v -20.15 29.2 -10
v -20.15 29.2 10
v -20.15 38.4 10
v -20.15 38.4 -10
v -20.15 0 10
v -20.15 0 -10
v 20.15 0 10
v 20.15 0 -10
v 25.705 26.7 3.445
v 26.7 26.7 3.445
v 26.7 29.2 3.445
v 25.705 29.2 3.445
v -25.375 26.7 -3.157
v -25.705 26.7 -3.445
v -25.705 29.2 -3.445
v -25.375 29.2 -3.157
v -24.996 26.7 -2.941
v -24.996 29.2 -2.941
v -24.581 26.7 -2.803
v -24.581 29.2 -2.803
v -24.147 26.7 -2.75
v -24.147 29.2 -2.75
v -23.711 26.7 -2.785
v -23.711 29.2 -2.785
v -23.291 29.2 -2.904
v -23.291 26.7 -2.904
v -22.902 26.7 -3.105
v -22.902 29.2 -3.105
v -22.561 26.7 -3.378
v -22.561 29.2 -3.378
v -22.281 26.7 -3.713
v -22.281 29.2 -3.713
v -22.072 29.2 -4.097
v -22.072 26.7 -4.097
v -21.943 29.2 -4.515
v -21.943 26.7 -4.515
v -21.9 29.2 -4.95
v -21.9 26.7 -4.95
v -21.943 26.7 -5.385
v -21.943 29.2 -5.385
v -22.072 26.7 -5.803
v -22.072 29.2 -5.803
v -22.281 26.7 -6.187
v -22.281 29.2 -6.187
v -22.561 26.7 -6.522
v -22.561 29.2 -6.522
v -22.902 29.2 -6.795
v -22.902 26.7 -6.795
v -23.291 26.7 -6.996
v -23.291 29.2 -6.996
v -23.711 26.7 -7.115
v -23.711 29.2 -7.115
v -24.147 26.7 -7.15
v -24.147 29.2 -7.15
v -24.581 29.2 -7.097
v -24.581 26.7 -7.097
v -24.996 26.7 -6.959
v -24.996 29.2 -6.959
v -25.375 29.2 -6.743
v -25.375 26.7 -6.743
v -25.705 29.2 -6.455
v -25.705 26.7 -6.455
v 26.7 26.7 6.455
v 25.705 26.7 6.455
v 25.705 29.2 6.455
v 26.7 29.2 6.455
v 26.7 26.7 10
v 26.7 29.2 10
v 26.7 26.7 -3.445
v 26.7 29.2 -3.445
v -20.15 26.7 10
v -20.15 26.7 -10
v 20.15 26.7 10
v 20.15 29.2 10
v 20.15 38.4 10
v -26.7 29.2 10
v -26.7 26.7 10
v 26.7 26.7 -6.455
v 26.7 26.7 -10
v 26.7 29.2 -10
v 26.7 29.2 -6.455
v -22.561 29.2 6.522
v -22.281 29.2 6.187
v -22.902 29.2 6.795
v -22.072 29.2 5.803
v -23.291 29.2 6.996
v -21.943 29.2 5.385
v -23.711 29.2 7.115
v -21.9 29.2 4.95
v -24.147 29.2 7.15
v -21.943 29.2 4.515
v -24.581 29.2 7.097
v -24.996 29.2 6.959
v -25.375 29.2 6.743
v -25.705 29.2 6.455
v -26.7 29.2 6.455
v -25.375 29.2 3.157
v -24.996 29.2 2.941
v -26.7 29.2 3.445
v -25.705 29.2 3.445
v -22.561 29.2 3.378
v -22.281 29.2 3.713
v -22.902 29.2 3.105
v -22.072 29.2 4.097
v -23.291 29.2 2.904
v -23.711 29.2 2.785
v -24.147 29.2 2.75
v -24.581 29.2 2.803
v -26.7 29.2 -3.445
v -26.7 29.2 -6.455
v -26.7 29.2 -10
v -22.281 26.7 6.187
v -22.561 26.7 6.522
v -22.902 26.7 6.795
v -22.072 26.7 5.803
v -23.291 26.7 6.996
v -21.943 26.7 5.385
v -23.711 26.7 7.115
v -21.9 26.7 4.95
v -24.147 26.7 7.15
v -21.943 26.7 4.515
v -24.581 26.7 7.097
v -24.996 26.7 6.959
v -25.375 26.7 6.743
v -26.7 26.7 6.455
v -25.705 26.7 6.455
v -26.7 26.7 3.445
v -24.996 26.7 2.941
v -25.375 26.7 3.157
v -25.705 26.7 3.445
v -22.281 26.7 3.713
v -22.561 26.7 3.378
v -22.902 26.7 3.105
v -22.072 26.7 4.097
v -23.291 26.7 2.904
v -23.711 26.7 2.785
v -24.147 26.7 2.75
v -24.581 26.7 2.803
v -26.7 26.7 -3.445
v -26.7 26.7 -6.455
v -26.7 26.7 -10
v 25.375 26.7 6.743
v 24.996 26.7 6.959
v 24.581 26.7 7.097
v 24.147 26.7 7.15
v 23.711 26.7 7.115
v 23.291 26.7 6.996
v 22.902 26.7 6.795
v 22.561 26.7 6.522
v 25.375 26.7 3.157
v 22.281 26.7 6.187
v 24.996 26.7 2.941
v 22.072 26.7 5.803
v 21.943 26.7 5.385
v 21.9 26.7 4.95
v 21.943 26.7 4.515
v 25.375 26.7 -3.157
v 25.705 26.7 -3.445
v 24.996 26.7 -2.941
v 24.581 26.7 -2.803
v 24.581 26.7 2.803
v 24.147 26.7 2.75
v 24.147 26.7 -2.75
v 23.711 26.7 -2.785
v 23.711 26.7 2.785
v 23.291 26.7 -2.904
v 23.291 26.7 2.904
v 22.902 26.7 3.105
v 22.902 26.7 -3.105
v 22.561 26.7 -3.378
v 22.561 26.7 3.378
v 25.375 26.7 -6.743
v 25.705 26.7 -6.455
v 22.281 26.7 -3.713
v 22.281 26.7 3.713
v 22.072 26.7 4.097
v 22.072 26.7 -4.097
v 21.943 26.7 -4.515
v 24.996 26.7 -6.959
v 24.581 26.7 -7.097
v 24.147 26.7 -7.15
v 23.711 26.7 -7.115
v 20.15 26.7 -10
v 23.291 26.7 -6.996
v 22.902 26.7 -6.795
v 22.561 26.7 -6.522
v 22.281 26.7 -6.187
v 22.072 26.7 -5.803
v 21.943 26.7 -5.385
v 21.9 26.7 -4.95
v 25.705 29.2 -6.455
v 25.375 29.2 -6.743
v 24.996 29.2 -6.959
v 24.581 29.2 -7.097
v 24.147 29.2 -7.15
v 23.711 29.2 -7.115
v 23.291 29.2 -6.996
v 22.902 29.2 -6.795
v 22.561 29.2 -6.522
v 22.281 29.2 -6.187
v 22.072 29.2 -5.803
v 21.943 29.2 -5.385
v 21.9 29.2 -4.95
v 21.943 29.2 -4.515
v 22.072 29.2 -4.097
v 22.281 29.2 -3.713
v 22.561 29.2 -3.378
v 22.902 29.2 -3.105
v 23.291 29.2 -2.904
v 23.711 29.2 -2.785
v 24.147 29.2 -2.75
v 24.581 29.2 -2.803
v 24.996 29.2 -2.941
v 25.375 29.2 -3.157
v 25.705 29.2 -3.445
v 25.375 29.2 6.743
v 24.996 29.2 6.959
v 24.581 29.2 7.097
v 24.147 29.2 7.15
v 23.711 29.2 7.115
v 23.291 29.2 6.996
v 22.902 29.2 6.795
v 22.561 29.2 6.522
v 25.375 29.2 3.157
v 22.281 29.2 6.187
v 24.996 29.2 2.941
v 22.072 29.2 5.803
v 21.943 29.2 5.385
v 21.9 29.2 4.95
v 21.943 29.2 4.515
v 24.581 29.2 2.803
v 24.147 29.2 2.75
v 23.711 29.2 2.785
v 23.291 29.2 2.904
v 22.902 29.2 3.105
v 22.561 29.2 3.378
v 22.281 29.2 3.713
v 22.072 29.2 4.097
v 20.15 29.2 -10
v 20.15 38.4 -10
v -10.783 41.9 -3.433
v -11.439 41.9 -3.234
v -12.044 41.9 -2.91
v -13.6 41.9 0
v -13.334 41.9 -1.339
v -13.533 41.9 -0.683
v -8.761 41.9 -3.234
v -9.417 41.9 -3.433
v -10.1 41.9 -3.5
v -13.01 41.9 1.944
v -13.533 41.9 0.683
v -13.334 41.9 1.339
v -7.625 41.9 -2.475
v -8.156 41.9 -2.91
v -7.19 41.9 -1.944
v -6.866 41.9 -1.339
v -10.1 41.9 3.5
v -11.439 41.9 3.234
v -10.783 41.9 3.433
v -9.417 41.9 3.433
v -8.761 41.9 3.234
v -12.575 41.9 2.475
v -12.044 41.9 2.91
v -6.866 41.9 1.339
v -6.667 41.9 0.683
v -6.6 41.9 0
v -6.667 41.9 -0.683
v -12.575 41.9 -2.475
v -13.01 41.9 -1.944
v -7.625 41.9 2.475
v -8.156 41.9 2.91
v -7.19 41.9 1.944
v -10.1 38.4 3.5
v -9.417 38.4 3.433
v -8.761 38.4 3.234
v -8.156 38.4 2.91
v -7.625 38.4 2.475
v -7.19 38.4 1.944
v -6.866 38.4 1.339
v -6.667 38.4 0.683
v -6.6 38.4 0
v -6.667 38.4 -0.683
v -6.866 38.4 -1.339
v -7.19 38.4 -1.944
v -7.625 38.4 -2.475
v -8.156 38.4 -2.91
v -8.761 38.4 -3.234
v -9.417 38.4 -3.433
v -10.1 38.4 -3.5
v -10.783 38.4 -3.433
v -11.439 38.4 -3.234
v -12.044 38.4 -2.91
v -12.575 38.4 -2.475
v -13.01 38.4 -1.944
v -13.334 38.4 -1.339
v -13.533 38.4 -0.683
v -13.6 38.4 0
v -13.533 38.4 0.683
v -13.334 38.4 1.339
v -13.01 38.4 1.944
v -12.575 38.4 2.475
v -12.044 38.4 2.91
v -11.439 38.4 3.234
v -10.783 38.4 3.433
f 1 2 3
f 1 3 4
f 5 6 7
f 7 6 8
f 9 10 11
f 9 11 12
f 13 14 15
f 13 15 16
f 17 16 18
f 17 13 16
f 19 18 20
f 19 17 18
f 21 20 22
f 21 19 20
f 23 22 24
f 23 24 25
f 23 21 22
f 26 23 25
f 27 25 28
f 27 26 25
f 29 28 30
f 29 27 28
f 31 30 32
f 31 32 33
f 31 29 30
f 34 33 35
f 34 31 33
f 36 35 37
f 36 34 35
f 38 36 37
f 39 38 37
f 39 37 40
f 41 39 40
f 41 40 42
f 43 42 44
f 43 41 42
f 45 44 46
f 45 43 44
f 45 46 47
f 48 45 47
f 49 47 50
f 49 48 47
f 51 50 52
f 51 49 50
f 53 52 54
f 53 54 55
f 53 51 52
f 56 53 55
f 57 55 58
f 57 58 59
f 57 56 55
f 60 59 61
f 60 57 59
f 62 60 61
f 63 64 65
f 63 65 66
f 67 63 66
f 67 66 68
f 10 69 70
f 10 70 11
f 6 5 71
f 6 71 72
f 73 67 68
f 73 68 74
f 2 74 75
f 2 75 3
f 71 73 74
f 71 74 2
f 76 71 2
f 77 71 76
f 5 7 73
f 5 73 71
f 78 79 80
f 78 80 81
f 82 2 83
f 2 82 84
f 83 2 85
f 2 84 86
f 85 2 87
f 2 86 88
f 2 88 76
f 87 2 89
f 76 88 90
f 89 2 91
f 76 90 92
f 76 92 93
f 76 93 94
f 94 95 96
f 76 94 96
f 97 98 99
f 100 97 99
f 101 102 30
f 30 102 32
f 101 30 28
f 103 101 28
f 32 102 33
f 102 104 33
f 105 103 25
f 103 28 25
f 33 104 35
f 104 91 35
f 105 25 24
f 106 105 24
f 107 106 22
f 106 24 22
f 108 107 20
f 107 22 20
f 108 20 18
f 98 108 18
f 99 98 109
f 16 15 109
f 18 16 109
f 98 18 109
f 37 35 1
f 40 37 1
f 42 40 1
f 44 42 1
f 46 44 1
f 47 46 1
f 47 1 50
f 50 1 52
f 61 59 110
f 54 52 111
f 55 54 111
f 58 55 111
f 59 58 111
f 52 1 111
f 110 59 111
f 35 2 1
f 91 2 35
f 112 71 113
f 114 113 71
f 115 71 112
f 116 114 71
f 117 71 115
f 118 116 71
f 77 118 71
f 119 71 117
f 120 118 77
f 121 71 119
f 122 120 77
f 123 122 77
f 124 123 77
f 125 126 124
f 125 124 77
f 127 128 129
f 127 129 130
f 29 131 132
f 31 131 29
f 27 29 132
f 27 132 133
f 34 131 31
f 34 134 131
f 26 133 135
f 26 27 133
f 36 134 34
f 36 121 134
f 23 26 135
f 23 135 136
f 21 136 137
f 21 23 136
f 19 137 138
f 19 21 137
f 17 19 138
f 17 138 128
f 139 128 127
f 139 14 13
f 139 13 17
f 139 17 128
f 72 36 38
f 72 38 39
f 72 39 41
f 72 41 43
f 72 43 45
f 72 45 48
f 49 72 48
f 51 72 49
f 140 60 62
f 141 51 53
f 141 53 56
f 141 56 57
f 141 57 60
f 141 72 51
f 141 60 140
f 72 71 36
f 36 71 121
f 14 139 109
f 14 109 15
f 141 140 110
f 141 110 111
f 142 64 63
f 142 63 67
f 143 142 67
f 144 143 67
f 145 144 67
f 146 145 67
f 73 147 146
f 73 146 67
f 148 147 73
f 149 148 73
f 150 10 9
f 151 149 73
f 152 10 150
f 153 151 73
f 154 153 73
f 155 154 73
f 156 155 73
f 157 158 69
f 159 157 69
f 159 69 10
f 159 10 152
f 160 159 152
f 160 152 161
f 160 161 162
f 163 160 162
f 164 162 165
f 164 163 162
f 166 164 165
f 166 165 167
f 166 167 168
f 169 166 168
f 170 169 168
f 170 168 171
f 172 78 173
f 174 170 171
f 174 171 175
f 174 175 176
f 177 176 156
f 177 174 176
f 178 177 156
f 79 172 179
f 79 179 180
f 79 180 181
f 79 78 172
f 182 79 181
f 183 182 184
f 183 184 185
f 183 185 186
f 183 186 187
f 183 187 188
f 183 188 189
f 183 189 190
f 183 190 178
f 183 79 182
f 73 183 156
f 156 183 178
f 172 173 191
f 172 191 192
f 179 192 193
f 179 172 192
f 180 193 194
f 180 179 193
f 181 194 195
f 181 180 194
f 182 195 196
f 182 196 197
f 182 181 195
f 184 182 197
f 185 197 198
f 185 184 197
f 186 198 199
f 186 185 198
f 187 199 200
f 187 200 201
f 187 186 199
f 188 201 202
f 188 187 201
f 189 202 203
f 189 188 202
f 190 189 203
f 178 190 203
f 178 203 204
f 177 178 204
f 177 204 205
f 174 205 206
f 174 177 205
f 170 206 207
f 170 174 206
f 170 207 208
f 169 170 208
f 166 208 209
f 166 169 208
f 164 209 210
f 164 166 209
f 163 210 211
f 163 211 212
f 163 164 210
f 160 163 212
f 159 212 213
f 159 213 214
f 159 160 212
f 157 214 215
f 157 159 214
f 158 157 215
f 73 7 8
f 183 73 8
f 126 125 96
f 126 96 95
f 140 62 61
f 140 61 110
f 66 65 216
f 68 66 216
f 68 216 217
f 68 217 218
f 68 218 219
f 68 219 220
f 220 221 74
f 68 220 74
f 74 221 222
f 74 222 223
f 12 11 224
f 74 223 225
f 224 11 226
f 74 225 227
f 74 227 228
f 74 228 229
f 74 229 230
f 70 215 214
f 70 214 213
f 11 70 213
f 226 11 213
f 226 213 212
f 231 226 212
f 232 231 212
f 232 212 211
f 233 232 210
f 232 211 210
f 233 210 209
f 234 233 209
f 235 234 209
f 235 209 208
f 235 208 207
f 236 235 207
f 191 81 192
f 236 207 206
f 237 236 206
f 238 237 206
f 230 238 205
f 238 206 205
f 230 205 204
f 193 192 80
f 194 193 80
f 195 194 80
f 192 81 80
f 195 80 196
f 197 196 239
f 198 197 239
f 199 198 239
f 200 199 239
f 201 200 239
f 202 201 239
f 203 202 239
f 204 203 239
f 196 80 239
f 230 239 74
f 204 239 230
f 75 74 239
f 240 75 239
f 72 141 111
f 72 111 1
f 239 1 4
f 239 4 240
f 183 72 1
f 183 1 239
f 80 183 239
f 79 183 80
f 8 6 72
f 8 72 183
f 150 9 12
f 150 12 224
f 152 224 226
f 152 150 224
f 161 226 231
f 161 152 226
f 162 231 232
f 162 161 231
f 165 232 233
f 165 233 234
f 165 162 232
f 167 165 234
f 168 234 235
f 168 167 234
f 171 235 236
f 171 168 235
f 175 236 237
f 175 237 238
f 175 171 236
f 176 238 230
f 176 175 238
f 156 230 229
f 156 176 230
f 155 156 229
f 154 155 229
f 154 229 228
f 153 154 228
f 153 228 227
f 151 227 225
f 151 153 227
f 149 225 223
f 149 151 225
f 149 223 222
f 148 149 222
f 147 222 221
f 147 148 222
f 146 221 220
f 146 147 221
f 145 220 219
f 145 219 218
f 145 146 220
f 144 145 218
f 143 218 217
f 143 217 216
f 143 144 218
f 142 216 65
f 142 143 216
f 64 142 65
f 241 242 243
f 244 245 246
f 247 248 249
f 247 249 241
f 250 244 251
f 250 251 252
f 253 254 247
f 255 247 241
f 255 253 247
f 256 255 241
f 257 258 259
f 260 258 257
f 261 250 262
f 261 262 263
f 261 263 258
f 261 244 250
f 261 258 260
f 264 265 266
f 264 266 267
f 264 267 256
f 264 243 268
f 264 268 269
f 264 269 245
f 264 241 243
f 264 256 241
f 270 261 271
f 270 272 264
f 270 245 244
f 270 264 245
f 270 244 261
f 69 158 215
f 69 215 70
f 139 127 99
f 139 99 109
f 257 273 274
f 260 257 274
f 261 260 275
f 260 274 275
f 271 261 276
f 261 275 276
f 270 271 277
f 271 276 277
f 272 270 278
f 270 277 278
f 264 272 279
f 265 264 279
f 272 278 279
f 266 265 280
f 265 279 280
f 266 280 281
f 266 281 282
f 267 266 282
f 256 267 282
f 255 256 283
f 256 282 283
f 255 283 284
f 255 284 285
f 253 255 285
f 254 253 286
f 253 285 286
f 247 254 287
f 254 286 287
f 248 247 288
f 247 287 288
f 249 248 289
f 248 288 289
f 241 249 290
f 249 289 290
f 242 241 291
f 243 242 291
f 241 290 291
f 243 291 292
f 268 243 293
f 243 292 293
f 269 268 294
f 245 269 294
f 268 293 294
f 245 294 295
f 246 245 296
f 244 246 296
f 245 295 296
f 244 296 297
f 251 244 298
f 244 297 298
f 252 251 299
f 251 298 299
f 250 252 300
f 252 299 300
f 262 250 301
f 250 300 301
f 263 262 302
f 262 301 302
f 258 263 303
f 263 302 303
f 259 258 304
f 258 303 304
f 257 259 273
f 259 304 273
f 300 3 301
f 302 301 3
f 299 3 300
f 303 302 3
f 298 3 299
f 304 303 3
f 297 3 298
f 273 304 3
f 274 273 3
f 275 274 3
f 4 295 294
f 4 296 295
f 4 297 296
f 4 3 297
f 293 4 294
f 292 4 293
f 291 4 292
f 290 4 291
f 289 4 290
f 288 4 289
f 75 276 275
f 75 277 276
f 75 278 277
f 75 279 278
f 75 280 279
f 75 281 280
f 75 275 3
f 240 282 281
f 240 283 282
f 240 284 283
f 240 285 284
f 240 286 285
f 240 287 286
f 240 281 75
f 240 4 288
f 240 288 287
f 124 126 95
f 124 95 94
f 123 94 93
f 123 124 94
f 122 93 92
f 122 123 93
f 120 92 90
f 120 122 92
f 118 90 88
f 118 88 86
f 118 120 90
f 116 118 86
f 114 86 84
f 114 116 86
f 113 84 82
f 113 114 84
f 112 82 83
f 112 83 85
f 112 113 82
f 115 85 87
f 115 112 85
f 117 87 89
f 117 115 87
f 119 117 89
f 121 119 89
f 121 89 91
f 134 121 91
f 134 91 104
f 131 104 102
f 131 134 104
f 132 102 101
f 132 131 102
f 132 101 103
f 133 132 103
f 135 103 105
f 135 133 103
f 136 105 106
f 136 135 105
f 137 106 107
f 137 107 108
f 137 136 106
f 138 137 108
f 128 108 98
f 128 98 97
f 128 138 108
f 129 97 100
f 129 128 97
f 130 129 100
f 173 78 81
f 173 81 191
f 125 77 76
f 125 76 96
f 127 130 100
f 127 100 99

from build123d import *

# Parameters (mm, degrees)
SKETCH1_W           = 40.3
SKETCH1_H           = 20
BOSS_EXTRUDE1_DEPTH = 38.4
BOSS_EXTRUDE3_START = -11.7
BOSS_EXTRUDE3_DEPTH = 2.5
SKETCH5_R           = 3.5
BOSS_EXTRUDE4_DEPTH = 3.5


with BuildPart() as part:
    # Sketch1 → Boss-Extrude1 (new body)
    with BuildSketch(Plane(origin=(0, 0, 0), x_dir=(1, 0, 0), z_dir=(0, 1, 0))):
        Rectangle(SKETCH1_W, SKETCH1_H)
    extrude(amount=BOSS_EXTRUDE1_DEPTH)

    # Sketch3 → Boss-Extrude3 (add)
    with BuildSketch(Plane(origin=(0, 38.4, 0), x_dir=(1, 0, 0), z_dir=(0, 1, 0)).offset(BOSS_EXTRUDE3_START)):
        with BuildLine():
            Line((-26.7, 10), (26.7, 10))
            Line((26.7, 10), (26.7, 6.455172275))
            Line((26.7, 6.455172275), (25.704511273, 6.455172275))
            ThreePointArc((25.704511273, 6.455172275), (21.9, 4.95), (25.704511273, 3.444827725))
            Line((25.704511273, 3.444827725), (26.7, 3.444827725))
            Line((26.7, 3.444827725), (26.7, -3.444827725))
            Line((26.7, -3.444827725), (25.704511273, -3.444827725))
            ThreePointArc((25.704511273, -3.444827725), (21.9, -4.95), (25.704511273, -6.455172275))
            Line((25.704511273, -6.455172275), (26.7, -6.455172275))
            Line((26.7, -6.455172275), (26.7, -10))
            Line((26.7, -10), (-26.7, -10))
            Line((-26.7, -10), (-26.7, -6.455172275))
            Line((-26.7, -6.455172275), (-25.704511273, -6.455172275))
            ThreePointArc((-25.704511273, -6.455172275), (-21.9, -4.95), (-25.704511273, -3.444827725))
            Line((-25.704511273, -3.444827725), (-26.7, -3.444827725))
            Line((-26.7, -3.444827725), (-26.7, 3.444827725))
            Line((-26.7, 3.444827725), (-25.704511273, 3.444827725))
            ThreePointArc((-25.704511273, 3.444827725), (-21.9, 4.95), (-25.704511273, 6.455172275))
            Line((-25.704511273, 6.455172275), (-26.7, 6.455172275))
            Line((-26.7, 6.455172275), (-26.7, 10))
        make_face()
    extrude(amount=BOSS_EXTRUDE3_DEPTH)

    # Sketch5 → Boss-Extrude4 (add)
    with BuildSketch(Plane(origin=(0, 38.4, 0), x_dir=(1, 0, 0), z_dir=(0, 1, 0))):
        with Locations(Location((-10.1, 0, 0), (0, 0, 270))):
            Circle(SKETCH5_R)
    extrude(amount=BOSS_EXTRUDE4_DEPTH)


solid = part.part
